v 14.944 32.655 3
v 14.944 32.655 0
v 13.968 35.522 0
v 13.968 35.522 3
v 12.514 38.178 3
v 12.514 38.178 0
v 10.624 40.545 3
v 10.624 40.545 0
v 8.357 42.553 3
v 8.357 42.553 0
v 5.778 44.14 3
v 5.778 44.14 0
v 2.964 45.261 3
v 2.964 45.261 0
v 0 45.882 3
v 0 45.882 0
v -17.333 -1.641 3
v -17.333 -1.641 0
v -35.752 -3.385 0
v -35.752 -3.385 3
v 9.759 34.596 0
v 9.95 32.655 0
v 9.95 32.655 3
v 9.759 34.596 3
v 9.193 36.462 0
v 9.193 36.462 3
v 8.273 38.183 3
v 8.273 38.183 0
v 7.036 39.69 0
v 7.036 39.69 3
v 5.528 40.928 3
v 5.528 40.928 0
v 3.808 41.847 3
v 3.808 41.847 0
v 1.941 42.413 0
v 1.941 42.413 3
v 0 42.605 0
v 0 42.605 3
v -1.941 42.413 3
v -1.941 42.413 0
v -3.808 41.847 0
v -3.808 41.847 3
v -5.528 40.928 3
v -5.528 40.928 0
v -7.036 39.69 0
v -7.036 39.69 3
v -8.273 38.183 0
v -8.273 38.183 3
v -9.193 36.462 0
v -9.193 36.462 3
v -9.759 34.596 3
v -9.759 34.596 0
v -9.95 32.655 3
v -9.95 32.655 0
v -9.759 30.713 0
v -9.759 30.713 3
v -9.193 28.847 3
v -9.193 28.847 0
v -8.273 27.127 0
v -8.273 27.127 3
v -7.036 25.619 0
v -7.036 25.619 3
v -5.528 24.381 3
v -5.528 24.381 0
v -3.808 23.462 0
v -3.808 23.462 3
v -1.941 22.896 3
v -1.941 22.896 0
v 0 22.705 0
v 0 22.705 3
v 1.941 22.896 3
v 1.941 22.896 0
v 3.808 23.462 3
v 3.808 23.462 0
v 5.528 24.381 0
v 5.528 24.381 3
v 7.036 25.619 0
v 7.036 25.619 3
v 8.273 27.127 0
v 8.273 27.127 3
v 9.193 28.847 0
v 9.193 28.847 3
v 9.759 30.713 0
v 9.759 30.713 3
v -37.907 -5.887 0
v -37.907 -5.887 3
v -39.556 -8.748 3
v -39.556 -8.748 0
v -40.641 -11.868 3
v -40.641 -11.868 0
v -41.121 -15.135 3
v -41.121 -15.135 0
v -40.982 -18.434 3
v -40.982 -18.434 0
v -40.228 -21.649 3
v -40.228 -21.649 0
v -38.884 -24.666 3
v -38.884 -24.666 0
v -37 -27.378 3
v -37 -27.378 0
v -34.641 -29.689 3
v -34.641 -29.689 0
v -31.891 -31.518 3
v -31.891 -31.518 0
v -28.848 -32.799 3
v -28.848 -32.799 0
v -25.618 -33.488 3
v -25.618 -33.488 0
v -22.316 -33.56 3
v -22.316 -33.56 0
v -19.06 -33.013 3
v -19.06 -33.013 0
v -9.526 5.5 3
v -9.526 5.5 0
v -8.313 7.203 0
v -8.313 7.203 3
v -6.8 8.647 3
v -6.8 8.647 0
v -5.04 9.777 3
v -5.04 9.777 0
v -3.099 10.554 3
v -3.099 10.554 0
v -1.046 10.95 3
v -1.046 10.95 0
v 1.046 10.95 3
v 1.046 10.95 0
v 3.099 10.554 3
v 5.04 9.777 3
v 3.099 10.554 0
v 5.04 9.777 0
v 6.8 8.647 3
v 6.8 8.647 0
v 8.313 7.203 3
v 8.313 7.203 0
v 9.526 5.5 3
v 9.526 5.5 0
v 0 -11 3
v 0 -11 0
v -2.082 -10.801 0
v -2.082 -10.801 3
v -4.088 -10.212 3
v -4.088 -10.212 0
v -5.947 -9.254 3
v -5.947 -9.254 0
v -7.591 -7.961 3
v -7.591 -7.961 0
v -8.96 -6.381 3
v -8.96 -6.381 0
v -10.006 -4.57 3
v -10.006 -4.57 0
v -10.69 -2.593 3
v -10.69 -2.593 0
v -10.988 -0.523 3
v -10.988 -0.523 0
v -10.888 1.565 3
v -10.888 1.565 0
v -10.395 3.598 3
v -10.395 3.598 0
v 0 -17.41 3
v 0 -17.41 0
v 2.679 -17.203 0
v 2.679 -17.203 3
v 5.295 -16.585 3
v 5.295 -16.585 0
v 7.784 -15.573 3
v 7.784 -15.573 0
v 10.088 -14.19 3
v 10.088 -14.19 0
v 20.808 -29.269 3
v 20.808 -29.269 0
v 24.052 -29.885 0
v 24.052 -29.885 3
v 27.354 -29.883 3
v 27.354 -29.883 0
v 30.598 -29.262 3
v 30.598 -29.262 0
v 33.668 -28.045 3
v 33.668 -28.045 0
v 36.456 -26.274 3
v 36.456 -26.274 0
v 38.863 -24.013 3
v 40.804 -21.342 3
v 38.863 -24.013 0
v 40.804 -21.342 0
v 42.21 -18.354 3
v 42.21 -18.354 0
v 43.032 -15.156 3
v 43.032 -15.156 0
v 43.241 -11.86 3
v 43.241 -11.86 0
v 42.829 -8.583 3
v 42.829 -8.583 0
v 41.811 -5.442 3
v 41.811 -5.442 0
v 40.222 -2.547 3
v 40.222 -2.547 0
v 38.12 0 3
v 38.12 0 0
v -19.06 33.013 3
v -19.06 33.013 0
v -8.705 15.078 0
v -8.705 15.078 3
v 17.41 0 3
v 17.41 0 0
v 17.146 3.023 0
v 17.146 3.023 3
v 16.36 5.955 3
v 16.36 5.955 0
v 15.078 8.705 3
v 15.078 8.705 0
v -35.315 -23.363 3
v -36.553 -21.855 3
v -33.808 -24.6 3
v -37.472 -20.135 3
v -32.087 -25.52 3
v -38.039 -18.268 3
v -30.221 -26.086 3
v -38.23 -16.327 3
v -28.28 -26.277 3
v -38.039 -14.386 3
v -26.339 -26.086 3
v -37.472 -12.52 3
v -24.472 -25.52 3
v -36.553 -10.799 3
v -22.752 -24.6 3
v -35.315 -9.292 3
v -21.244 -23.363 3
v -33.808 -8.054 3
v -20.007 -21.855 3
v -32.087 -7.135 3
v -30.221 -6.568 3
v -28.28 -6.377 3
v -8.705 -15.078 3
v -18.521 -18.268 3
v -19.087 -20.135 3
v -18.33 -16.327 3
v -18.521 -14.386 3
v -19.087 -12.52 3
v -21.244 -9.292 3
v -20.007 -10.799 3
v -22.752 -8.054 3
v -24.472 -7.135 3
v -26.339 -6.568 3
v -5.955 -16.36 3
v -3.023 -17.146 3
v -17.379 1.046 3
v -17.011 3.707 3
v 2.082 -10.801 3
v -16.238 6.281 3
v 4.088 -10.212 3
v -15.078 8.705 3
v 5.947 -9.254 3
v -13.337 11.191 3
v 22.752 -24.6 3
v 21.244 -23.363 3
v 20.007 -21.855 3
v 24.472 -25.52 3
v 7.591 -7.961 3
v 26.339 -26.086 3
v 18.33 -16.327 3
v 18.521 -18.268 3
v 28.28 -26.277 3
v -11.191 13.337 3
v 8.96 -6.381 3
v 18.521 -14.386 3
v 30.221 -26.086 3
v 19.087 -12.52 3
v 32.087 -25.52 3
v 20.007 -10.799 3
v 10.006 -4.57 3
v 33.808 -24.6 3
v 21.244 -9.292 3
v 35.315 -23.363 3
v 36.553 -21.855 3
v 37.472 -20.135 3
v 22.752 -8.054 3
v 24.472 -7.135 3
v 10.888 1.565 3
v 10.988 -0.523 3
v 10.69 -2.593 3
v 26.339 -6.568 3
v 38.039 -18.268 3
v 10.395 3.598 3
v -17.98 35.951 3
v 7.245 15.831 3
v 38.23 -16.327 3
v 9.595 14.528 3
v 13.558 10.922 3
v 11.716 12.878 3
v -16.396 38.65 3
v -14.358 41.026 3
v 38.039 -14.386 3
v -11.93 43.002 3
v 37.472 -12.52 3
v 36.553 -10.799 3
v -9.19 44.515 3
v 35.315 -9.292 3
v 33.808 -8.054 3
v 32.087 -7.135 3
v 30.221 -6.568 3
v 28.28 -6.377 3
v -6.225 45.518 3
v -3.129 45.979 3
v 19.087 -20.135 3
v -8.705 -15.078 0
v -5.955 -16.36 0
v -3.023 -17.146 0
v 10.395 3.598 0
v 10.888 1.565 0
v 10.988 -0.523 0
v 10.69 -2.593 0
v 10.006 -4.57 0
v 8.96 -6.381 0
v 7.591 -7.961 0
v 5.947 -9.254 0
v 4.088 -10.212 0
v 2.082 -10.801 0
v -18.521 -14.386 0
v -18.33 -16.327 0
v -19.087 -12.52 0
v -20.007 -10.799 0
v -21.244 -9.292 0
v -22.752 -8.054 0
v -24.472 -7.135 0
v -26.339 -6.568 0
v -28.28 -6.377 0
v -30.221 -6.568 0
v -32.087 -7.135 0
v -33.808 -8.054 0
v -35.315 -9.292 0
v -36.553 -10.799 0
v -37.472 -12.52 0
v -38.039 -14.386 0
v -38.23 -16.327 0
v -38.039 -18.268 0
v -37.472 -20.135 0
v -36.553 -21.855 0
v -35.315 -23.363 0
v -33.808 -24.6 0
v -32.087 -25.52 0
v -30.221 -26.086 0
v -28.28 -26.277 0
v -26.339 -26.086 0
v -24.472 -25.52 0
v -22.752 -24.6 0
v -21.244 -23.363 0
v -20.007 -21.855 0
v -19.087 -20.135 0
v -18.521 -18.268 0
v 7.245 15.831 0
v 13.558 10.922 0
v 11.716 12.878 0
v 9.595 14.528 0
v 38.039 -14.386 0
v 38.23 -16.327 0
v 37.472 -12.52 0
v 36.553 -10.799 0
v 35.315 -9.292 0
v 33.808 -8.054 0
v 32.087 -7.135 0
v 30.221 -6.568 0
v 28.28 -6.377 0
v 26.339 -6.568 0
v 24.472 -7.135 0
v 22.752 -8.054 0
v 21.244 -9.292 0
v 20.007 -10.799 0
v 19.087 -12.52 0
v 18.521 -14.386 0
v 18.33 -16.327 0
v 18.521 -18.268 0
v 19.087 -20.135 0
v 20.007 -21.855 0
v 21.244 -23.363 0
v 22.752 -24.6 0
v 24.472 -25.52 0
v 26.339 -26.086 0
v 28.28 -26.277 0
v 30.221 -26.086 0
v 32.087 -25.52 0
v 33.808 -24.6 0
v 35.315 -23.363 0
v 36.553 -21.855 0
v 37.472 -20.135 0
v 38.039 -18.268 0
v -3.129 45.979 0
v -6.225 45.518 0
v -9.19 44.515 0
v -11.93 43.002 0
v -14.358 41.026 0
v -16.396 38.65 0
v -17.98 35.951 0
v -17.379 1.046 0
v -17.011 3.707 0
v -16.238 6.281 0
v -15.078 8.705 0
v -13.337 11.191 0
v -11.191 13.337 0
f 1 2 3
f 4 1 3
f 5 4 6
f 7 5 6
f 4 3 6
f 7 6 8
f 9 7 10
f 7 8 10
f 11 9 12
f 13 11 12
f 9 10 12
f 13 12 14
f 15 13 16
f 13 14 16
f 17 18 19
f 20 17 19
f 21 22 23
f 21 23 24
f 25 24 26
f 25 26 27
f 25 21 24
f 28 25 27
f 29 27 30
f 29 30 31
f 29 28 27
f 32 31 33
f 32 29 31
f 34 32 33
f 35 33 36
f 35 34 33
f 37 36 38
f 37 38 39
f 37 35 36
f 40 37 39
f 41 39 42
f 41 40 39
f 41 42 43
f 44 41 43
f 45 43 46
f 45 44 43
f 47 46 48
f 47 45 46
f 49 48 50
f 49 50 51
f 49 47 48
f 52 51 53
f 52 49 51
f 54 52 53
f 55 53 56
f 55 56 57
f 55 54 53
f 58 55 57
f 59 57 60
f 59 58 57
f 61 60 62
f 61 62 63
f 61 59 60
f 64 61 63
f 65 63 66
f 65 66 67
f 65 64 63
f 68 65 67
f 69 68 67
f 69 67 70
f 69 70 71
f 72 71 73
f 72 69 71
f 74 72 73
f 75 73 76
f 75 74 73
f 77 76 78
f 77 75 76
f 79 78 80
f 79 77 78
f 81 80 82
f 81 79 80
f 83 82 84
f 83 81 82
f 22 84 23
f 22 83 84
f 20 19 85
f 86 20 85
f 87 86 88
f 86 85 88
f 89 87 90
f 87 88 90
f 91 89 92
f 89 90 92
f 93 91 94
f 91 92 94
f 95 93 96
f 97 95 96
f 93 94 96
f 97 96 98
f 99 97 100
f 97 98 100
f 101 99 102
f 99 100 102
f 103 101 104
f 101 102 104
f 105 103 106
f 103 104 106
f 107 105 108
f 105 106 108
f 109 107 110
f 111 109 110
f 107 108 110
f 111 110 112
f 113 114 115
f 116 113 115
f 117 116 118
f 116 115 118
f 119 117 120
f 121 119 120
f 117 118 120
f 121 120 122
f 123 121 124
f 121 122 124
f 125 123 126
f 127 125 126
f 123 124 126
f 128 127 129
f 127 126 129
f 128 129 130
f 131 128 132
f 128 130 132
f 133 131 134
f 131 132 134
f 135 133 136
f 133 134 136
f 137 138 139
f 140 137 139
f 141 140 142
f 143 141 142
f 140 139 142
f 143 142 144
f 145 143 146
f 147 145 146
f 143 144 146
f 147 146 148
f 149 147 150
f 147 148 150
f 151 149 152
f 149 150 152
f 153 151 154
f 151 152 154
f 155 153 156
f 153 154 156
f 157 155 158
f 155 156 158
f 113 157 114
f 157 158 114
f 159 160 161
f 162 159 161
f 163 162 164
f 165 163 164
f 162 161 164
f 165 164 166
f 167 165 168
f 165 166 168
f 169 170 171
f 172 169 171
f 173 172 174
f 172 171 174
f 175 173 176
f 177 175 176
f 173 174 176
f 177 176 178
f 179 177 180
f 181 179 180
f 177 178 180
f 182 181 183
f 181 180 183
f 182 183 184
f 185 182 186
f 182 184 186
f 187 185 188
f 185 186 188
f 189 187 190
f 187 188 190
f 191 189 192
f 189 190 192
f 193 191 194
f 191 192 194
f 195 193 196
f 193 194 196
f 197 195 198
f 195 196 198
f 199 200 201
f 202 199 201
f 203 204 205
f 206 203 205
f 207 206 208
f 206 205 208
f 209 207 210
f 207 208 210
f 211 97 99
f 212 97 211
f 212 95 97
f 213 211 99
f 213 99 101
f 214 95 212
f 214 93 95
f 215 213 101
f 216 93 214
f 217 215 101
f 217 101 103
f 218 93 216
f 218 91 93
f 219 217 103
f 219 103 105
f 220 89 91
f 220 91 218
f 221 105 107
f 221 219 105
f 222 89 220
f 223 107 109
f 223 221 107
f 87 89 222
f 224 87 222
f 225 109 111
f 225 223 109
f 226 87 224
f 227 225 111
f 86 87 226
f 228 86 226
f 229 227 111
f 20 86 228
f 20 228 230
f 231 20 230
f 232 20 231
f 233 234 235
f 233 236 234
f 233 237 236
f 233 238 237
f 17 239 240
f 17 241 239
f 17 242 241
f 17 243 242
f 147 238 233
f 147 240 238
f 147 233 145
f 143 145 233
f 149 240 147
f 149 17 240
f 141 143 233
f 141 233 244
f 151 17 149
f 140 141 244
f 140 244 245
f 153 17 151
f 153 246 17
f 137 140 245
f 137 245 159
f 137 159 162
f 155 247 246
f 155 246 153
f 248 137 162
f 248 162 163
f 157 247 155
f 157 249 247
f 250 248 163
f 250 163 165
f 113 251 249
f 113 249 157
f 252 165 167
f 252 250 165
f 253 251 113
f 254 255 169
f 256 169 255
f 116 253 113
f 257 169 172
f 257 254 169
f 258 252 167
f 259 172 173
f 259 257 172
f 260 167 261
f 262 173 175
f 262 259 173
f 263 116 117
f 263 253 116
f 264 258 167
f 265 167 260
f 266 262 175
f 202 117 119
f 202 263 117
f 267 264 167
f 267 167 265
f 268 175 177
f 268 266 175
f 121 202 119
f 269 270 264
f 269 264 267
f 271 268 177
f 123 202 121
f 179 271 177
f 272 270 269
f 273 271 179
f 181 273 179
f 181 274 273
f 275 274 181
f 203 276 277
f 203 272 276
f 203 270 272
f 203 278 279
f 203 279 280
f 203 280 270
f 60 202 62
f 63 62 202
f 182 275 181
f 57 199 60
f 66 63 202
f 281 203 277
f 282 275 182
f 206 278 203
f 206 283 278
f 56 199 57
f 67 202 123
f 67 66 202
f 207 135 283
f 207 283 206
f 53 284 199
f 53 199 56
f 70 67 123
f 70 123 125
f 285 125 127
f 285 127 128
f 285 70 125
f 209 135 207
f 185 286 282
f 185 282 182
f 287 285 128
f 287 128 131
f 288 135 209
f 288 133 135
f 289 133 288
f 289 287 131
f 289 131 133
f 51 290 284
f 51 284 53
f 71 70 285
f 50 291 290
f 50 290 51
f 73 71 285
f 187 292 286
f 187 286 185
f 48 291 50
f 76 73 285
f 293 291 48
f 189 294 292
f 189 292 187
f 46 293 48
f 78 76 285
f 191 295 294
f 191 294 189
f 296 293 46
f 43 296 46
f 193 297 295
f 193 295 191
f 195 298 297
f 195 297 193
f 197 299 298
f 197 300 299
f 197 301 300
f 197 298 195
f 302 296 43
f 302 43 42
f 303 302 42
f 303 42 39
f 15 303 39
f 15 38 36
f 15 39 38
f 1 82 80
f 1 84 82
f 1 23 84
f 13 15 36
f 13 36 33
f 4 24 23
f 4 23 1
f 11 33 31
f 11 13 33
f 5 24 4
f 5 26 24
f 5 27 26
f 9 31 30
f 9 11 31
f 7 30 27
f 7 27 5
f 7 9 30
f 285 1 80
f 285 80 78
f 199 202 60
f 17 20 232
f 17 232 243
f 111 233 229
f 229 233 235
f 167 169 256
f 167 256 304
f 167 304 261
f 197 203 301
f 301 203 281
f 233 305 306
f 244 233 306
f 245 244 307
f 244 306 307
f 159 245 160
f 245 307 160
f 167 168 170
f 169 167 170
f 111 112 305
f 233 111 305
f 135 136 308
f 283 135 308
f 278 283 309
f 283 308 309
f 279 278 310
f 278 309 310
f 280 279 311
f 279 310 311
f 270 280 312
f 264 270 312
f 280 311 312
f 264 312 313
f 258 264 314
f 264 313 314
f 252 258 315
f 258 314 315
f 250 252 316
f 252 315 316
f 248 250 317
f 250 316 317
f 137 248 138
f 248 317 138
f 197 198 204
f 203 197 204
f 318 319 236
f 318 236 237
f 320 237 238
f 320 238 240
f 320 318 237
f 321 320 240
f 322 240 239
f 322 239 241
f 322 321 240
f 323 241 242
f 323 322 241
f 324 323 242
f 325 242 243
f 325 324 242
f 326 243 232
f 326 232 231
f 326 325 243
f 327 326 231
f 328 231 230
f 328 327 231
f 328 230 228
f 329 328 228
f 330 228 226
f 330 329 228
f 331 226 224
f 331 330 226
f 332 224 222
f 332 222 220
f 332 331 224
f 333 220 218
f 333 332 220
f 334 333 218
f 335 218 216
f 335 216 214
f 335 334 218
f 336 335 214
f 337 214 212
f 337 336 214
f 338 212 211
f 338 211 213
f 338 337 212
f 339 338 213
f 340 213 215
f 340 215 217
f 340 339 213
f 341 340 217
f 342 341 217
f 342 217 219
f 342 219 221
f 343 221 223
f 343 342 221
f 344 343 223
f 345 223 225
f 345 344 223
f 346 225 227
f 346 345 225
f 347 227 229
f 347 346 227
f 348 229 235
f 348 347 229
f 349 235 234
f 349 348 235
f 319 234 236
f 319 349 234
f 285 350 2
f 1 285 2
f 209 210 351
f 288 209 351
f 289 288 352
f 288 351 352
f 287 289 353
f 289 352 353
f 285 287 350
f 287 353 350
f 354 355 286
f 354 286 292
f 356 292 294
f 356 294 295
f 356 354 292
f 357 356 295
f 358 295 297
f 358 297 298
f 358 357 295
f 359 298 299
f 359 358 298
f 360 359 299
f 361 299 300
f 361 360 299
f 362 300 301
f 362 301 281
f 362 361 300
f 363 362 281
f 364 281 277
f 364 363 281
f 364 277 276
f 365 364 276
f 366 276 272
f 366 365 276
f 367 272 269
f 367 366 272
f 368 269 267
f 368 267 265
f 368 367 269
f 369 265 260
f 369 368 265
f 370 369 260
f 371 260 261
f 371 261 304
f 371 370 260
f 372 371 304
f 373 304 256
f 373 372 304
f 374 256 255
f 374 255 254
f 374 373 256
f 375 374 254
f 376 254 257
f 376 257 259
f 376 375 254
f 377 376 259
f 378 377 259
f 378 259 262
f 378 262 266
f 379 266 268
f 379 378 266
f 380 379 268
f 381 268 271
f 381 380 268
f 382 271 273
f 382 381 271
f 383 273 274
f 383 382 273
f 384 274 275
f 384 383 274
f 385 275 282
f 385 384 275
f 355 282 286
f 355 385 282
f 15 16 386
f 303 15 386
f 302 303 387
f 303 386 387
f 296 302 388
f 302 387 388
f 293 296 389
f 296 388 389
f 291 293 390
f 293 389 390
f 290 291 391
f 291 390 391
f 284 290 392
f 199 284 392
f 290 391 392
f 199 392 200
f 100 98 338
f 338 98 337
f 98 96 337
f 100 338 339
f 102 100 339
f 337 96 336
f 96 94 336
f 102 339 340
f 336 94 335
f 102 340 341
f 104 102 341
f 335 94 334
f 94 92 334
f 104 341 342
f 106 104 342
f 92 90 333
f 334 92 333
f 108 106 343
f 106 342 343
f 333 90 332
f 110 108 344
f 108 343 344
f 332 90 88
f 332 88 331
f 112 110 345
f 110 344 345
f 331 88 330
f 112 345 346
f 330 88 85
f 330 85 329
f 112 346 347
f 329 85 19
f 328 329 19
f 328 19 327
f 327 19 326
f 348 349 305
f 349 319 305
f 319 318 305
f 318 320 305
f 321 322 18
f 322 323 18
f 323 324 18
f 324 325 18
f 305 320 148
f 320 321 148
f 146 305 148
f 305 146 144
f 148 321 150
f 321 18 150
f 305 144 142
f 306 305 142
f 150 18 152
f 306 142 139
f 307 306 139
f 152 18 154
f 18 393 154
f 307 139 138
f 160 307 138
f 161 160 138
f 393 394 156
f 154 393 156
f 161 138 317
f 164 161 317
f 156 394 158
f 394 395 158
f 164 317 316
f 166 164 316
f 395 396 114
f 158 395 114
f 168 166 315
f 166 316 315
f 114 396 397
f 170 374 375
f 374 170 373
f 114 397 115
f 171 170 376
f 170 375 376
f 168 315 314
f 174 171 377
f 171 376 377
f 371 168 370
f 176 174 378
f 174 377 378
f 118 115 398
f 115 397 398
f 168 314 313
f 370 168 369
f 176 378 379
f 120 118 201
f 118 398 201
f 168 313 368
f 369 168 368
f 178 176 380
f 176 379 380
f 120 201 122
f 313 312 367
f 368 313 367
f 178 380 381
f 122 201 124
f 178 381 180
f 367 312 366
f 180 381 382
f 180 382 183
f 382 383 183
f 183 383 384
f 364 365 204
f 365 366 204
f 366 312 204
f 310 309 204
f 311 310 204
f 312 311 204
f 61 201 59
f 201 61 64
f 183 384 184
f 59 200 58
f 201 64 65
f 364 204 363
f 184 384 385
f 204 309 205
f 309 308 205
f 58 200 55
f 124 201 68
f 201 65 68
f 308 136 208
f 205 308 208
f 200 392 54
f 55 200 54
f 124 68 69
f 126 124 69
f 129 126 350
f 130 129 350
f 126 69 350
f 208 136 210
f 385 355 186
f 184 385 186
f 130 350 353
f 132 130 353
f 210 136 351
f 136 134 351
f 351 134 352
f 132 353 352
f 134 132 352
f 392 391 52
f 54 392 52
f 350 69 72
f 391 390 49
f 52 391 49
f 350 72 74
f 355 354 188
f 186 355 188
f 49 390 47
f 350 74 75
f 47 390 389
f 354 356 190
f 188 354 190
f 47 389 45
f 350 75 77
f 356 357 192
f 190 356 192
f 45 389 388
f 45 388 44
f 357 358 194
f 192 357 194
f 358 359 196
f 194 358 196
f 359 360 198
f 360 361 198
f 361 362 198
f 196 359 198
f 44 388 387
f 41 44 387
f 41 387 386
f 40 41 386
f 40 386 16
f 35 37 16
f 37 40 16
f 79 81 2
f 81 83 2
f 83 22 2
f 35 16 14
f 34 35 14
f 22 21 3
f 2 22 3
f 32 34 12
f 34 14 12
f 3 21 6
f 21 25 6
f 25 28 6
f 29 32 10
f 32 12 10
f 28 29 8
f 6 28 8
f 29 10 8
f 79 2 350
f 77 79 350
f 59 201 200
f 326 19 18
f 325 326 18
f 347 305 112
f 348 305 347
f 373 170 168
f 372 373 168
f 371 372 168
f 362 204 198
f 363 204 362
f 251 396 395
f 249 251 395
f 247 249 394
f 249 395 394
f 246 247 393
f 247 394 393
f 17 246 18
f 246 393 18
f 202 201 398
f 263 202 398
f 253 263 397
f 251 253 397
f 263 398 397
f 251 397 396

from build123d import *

# Parameters (mm, degrees)
F0_R     = 9.95
F1_DEPTH = 3


with BuildPart() as f1:
    # F0 (on Top) → F1 (new body)
    with BuildSketch(Plane.XY):
        with BuildLine():
            Line((7.244864, 15.831038), (14.943939, 32.654589))
            ThreePointArc((14.943939, 32.654589), (9.53394, 41.597928), (0, 45.882246))
            ThreePointArc((0, 45.882246), (-11.930072, 43.001993), (-19.059785, 33.012515))
            Line((-19.059785, 33.012515), (-8.705025, 15.077545))
            ThreePointArc((-8.705025, 15.077545), (-12.310764, 12.310764), (-15.077545, 8.705025))
            ThreePointArc((-15.077545, 8.705025), (-17.010717, 3.70747), (-17.332513, -1.641283))
            Line((-17.332513, -1.641283), (-35.751673, -3.385464))
            ThreePointArc((-35.751673, -3.385464), (-38.884293, -24.666016), (-19.059785, -33.012515))
            Line((-19.059785, -33.012515), (-8.705025, -15.077545))
            ThreePointArc((-8.705025, -15.077545), (-4.506052, -16.816817), (0, -17.41005))
            ThreePointArc((0, -17.41005), (5.294595, -16.585448), (10.087649, -14.189756))
            Line((10.087649, -14.189756), (20.807735, -29.269125))
            ThreePointArc((20.807735, -29.269125), (40.803543, -21.341778), (38.119569, 0))
            Line((38.119569, 0), (17.41005, 0))
            ThreePointArc((17.41005, 0), (16.816817, 4.506052), (15.077545, 8.705025))
            ThreePointArc((15.077545, 8.705025), (11.716122, 12.877978), (7.244864, 15.831038))
        make_face()
        with Locations((-28.279704, -16.327295)):
            Circle(F0_R, mode=Mode.SUBTRACT)
        with BuildLine():
            ThreePointArc((-9.526279, 5.5), (0, 11), (9.526279, 5.5))
            ThreePointArc((9.526279, 5.5), (9.526279, -5.5), (0, -11))
            ThreePointArc((0, -11), (-9.526279, -5.5), (-9.526279, 5.5))
        make_face(mode=Mode.SUBTRACT)
        with Locations((28.279704, -16.327295)):
            Circle(F0_R, mode=Mode.SUBTRACT)
        with Locations((0, 32.654589)):
            Circle(F0_R, mode=Mode.SUBTRACT)
    extrude(amount=F1_DEPTH)


solid = f1.part
